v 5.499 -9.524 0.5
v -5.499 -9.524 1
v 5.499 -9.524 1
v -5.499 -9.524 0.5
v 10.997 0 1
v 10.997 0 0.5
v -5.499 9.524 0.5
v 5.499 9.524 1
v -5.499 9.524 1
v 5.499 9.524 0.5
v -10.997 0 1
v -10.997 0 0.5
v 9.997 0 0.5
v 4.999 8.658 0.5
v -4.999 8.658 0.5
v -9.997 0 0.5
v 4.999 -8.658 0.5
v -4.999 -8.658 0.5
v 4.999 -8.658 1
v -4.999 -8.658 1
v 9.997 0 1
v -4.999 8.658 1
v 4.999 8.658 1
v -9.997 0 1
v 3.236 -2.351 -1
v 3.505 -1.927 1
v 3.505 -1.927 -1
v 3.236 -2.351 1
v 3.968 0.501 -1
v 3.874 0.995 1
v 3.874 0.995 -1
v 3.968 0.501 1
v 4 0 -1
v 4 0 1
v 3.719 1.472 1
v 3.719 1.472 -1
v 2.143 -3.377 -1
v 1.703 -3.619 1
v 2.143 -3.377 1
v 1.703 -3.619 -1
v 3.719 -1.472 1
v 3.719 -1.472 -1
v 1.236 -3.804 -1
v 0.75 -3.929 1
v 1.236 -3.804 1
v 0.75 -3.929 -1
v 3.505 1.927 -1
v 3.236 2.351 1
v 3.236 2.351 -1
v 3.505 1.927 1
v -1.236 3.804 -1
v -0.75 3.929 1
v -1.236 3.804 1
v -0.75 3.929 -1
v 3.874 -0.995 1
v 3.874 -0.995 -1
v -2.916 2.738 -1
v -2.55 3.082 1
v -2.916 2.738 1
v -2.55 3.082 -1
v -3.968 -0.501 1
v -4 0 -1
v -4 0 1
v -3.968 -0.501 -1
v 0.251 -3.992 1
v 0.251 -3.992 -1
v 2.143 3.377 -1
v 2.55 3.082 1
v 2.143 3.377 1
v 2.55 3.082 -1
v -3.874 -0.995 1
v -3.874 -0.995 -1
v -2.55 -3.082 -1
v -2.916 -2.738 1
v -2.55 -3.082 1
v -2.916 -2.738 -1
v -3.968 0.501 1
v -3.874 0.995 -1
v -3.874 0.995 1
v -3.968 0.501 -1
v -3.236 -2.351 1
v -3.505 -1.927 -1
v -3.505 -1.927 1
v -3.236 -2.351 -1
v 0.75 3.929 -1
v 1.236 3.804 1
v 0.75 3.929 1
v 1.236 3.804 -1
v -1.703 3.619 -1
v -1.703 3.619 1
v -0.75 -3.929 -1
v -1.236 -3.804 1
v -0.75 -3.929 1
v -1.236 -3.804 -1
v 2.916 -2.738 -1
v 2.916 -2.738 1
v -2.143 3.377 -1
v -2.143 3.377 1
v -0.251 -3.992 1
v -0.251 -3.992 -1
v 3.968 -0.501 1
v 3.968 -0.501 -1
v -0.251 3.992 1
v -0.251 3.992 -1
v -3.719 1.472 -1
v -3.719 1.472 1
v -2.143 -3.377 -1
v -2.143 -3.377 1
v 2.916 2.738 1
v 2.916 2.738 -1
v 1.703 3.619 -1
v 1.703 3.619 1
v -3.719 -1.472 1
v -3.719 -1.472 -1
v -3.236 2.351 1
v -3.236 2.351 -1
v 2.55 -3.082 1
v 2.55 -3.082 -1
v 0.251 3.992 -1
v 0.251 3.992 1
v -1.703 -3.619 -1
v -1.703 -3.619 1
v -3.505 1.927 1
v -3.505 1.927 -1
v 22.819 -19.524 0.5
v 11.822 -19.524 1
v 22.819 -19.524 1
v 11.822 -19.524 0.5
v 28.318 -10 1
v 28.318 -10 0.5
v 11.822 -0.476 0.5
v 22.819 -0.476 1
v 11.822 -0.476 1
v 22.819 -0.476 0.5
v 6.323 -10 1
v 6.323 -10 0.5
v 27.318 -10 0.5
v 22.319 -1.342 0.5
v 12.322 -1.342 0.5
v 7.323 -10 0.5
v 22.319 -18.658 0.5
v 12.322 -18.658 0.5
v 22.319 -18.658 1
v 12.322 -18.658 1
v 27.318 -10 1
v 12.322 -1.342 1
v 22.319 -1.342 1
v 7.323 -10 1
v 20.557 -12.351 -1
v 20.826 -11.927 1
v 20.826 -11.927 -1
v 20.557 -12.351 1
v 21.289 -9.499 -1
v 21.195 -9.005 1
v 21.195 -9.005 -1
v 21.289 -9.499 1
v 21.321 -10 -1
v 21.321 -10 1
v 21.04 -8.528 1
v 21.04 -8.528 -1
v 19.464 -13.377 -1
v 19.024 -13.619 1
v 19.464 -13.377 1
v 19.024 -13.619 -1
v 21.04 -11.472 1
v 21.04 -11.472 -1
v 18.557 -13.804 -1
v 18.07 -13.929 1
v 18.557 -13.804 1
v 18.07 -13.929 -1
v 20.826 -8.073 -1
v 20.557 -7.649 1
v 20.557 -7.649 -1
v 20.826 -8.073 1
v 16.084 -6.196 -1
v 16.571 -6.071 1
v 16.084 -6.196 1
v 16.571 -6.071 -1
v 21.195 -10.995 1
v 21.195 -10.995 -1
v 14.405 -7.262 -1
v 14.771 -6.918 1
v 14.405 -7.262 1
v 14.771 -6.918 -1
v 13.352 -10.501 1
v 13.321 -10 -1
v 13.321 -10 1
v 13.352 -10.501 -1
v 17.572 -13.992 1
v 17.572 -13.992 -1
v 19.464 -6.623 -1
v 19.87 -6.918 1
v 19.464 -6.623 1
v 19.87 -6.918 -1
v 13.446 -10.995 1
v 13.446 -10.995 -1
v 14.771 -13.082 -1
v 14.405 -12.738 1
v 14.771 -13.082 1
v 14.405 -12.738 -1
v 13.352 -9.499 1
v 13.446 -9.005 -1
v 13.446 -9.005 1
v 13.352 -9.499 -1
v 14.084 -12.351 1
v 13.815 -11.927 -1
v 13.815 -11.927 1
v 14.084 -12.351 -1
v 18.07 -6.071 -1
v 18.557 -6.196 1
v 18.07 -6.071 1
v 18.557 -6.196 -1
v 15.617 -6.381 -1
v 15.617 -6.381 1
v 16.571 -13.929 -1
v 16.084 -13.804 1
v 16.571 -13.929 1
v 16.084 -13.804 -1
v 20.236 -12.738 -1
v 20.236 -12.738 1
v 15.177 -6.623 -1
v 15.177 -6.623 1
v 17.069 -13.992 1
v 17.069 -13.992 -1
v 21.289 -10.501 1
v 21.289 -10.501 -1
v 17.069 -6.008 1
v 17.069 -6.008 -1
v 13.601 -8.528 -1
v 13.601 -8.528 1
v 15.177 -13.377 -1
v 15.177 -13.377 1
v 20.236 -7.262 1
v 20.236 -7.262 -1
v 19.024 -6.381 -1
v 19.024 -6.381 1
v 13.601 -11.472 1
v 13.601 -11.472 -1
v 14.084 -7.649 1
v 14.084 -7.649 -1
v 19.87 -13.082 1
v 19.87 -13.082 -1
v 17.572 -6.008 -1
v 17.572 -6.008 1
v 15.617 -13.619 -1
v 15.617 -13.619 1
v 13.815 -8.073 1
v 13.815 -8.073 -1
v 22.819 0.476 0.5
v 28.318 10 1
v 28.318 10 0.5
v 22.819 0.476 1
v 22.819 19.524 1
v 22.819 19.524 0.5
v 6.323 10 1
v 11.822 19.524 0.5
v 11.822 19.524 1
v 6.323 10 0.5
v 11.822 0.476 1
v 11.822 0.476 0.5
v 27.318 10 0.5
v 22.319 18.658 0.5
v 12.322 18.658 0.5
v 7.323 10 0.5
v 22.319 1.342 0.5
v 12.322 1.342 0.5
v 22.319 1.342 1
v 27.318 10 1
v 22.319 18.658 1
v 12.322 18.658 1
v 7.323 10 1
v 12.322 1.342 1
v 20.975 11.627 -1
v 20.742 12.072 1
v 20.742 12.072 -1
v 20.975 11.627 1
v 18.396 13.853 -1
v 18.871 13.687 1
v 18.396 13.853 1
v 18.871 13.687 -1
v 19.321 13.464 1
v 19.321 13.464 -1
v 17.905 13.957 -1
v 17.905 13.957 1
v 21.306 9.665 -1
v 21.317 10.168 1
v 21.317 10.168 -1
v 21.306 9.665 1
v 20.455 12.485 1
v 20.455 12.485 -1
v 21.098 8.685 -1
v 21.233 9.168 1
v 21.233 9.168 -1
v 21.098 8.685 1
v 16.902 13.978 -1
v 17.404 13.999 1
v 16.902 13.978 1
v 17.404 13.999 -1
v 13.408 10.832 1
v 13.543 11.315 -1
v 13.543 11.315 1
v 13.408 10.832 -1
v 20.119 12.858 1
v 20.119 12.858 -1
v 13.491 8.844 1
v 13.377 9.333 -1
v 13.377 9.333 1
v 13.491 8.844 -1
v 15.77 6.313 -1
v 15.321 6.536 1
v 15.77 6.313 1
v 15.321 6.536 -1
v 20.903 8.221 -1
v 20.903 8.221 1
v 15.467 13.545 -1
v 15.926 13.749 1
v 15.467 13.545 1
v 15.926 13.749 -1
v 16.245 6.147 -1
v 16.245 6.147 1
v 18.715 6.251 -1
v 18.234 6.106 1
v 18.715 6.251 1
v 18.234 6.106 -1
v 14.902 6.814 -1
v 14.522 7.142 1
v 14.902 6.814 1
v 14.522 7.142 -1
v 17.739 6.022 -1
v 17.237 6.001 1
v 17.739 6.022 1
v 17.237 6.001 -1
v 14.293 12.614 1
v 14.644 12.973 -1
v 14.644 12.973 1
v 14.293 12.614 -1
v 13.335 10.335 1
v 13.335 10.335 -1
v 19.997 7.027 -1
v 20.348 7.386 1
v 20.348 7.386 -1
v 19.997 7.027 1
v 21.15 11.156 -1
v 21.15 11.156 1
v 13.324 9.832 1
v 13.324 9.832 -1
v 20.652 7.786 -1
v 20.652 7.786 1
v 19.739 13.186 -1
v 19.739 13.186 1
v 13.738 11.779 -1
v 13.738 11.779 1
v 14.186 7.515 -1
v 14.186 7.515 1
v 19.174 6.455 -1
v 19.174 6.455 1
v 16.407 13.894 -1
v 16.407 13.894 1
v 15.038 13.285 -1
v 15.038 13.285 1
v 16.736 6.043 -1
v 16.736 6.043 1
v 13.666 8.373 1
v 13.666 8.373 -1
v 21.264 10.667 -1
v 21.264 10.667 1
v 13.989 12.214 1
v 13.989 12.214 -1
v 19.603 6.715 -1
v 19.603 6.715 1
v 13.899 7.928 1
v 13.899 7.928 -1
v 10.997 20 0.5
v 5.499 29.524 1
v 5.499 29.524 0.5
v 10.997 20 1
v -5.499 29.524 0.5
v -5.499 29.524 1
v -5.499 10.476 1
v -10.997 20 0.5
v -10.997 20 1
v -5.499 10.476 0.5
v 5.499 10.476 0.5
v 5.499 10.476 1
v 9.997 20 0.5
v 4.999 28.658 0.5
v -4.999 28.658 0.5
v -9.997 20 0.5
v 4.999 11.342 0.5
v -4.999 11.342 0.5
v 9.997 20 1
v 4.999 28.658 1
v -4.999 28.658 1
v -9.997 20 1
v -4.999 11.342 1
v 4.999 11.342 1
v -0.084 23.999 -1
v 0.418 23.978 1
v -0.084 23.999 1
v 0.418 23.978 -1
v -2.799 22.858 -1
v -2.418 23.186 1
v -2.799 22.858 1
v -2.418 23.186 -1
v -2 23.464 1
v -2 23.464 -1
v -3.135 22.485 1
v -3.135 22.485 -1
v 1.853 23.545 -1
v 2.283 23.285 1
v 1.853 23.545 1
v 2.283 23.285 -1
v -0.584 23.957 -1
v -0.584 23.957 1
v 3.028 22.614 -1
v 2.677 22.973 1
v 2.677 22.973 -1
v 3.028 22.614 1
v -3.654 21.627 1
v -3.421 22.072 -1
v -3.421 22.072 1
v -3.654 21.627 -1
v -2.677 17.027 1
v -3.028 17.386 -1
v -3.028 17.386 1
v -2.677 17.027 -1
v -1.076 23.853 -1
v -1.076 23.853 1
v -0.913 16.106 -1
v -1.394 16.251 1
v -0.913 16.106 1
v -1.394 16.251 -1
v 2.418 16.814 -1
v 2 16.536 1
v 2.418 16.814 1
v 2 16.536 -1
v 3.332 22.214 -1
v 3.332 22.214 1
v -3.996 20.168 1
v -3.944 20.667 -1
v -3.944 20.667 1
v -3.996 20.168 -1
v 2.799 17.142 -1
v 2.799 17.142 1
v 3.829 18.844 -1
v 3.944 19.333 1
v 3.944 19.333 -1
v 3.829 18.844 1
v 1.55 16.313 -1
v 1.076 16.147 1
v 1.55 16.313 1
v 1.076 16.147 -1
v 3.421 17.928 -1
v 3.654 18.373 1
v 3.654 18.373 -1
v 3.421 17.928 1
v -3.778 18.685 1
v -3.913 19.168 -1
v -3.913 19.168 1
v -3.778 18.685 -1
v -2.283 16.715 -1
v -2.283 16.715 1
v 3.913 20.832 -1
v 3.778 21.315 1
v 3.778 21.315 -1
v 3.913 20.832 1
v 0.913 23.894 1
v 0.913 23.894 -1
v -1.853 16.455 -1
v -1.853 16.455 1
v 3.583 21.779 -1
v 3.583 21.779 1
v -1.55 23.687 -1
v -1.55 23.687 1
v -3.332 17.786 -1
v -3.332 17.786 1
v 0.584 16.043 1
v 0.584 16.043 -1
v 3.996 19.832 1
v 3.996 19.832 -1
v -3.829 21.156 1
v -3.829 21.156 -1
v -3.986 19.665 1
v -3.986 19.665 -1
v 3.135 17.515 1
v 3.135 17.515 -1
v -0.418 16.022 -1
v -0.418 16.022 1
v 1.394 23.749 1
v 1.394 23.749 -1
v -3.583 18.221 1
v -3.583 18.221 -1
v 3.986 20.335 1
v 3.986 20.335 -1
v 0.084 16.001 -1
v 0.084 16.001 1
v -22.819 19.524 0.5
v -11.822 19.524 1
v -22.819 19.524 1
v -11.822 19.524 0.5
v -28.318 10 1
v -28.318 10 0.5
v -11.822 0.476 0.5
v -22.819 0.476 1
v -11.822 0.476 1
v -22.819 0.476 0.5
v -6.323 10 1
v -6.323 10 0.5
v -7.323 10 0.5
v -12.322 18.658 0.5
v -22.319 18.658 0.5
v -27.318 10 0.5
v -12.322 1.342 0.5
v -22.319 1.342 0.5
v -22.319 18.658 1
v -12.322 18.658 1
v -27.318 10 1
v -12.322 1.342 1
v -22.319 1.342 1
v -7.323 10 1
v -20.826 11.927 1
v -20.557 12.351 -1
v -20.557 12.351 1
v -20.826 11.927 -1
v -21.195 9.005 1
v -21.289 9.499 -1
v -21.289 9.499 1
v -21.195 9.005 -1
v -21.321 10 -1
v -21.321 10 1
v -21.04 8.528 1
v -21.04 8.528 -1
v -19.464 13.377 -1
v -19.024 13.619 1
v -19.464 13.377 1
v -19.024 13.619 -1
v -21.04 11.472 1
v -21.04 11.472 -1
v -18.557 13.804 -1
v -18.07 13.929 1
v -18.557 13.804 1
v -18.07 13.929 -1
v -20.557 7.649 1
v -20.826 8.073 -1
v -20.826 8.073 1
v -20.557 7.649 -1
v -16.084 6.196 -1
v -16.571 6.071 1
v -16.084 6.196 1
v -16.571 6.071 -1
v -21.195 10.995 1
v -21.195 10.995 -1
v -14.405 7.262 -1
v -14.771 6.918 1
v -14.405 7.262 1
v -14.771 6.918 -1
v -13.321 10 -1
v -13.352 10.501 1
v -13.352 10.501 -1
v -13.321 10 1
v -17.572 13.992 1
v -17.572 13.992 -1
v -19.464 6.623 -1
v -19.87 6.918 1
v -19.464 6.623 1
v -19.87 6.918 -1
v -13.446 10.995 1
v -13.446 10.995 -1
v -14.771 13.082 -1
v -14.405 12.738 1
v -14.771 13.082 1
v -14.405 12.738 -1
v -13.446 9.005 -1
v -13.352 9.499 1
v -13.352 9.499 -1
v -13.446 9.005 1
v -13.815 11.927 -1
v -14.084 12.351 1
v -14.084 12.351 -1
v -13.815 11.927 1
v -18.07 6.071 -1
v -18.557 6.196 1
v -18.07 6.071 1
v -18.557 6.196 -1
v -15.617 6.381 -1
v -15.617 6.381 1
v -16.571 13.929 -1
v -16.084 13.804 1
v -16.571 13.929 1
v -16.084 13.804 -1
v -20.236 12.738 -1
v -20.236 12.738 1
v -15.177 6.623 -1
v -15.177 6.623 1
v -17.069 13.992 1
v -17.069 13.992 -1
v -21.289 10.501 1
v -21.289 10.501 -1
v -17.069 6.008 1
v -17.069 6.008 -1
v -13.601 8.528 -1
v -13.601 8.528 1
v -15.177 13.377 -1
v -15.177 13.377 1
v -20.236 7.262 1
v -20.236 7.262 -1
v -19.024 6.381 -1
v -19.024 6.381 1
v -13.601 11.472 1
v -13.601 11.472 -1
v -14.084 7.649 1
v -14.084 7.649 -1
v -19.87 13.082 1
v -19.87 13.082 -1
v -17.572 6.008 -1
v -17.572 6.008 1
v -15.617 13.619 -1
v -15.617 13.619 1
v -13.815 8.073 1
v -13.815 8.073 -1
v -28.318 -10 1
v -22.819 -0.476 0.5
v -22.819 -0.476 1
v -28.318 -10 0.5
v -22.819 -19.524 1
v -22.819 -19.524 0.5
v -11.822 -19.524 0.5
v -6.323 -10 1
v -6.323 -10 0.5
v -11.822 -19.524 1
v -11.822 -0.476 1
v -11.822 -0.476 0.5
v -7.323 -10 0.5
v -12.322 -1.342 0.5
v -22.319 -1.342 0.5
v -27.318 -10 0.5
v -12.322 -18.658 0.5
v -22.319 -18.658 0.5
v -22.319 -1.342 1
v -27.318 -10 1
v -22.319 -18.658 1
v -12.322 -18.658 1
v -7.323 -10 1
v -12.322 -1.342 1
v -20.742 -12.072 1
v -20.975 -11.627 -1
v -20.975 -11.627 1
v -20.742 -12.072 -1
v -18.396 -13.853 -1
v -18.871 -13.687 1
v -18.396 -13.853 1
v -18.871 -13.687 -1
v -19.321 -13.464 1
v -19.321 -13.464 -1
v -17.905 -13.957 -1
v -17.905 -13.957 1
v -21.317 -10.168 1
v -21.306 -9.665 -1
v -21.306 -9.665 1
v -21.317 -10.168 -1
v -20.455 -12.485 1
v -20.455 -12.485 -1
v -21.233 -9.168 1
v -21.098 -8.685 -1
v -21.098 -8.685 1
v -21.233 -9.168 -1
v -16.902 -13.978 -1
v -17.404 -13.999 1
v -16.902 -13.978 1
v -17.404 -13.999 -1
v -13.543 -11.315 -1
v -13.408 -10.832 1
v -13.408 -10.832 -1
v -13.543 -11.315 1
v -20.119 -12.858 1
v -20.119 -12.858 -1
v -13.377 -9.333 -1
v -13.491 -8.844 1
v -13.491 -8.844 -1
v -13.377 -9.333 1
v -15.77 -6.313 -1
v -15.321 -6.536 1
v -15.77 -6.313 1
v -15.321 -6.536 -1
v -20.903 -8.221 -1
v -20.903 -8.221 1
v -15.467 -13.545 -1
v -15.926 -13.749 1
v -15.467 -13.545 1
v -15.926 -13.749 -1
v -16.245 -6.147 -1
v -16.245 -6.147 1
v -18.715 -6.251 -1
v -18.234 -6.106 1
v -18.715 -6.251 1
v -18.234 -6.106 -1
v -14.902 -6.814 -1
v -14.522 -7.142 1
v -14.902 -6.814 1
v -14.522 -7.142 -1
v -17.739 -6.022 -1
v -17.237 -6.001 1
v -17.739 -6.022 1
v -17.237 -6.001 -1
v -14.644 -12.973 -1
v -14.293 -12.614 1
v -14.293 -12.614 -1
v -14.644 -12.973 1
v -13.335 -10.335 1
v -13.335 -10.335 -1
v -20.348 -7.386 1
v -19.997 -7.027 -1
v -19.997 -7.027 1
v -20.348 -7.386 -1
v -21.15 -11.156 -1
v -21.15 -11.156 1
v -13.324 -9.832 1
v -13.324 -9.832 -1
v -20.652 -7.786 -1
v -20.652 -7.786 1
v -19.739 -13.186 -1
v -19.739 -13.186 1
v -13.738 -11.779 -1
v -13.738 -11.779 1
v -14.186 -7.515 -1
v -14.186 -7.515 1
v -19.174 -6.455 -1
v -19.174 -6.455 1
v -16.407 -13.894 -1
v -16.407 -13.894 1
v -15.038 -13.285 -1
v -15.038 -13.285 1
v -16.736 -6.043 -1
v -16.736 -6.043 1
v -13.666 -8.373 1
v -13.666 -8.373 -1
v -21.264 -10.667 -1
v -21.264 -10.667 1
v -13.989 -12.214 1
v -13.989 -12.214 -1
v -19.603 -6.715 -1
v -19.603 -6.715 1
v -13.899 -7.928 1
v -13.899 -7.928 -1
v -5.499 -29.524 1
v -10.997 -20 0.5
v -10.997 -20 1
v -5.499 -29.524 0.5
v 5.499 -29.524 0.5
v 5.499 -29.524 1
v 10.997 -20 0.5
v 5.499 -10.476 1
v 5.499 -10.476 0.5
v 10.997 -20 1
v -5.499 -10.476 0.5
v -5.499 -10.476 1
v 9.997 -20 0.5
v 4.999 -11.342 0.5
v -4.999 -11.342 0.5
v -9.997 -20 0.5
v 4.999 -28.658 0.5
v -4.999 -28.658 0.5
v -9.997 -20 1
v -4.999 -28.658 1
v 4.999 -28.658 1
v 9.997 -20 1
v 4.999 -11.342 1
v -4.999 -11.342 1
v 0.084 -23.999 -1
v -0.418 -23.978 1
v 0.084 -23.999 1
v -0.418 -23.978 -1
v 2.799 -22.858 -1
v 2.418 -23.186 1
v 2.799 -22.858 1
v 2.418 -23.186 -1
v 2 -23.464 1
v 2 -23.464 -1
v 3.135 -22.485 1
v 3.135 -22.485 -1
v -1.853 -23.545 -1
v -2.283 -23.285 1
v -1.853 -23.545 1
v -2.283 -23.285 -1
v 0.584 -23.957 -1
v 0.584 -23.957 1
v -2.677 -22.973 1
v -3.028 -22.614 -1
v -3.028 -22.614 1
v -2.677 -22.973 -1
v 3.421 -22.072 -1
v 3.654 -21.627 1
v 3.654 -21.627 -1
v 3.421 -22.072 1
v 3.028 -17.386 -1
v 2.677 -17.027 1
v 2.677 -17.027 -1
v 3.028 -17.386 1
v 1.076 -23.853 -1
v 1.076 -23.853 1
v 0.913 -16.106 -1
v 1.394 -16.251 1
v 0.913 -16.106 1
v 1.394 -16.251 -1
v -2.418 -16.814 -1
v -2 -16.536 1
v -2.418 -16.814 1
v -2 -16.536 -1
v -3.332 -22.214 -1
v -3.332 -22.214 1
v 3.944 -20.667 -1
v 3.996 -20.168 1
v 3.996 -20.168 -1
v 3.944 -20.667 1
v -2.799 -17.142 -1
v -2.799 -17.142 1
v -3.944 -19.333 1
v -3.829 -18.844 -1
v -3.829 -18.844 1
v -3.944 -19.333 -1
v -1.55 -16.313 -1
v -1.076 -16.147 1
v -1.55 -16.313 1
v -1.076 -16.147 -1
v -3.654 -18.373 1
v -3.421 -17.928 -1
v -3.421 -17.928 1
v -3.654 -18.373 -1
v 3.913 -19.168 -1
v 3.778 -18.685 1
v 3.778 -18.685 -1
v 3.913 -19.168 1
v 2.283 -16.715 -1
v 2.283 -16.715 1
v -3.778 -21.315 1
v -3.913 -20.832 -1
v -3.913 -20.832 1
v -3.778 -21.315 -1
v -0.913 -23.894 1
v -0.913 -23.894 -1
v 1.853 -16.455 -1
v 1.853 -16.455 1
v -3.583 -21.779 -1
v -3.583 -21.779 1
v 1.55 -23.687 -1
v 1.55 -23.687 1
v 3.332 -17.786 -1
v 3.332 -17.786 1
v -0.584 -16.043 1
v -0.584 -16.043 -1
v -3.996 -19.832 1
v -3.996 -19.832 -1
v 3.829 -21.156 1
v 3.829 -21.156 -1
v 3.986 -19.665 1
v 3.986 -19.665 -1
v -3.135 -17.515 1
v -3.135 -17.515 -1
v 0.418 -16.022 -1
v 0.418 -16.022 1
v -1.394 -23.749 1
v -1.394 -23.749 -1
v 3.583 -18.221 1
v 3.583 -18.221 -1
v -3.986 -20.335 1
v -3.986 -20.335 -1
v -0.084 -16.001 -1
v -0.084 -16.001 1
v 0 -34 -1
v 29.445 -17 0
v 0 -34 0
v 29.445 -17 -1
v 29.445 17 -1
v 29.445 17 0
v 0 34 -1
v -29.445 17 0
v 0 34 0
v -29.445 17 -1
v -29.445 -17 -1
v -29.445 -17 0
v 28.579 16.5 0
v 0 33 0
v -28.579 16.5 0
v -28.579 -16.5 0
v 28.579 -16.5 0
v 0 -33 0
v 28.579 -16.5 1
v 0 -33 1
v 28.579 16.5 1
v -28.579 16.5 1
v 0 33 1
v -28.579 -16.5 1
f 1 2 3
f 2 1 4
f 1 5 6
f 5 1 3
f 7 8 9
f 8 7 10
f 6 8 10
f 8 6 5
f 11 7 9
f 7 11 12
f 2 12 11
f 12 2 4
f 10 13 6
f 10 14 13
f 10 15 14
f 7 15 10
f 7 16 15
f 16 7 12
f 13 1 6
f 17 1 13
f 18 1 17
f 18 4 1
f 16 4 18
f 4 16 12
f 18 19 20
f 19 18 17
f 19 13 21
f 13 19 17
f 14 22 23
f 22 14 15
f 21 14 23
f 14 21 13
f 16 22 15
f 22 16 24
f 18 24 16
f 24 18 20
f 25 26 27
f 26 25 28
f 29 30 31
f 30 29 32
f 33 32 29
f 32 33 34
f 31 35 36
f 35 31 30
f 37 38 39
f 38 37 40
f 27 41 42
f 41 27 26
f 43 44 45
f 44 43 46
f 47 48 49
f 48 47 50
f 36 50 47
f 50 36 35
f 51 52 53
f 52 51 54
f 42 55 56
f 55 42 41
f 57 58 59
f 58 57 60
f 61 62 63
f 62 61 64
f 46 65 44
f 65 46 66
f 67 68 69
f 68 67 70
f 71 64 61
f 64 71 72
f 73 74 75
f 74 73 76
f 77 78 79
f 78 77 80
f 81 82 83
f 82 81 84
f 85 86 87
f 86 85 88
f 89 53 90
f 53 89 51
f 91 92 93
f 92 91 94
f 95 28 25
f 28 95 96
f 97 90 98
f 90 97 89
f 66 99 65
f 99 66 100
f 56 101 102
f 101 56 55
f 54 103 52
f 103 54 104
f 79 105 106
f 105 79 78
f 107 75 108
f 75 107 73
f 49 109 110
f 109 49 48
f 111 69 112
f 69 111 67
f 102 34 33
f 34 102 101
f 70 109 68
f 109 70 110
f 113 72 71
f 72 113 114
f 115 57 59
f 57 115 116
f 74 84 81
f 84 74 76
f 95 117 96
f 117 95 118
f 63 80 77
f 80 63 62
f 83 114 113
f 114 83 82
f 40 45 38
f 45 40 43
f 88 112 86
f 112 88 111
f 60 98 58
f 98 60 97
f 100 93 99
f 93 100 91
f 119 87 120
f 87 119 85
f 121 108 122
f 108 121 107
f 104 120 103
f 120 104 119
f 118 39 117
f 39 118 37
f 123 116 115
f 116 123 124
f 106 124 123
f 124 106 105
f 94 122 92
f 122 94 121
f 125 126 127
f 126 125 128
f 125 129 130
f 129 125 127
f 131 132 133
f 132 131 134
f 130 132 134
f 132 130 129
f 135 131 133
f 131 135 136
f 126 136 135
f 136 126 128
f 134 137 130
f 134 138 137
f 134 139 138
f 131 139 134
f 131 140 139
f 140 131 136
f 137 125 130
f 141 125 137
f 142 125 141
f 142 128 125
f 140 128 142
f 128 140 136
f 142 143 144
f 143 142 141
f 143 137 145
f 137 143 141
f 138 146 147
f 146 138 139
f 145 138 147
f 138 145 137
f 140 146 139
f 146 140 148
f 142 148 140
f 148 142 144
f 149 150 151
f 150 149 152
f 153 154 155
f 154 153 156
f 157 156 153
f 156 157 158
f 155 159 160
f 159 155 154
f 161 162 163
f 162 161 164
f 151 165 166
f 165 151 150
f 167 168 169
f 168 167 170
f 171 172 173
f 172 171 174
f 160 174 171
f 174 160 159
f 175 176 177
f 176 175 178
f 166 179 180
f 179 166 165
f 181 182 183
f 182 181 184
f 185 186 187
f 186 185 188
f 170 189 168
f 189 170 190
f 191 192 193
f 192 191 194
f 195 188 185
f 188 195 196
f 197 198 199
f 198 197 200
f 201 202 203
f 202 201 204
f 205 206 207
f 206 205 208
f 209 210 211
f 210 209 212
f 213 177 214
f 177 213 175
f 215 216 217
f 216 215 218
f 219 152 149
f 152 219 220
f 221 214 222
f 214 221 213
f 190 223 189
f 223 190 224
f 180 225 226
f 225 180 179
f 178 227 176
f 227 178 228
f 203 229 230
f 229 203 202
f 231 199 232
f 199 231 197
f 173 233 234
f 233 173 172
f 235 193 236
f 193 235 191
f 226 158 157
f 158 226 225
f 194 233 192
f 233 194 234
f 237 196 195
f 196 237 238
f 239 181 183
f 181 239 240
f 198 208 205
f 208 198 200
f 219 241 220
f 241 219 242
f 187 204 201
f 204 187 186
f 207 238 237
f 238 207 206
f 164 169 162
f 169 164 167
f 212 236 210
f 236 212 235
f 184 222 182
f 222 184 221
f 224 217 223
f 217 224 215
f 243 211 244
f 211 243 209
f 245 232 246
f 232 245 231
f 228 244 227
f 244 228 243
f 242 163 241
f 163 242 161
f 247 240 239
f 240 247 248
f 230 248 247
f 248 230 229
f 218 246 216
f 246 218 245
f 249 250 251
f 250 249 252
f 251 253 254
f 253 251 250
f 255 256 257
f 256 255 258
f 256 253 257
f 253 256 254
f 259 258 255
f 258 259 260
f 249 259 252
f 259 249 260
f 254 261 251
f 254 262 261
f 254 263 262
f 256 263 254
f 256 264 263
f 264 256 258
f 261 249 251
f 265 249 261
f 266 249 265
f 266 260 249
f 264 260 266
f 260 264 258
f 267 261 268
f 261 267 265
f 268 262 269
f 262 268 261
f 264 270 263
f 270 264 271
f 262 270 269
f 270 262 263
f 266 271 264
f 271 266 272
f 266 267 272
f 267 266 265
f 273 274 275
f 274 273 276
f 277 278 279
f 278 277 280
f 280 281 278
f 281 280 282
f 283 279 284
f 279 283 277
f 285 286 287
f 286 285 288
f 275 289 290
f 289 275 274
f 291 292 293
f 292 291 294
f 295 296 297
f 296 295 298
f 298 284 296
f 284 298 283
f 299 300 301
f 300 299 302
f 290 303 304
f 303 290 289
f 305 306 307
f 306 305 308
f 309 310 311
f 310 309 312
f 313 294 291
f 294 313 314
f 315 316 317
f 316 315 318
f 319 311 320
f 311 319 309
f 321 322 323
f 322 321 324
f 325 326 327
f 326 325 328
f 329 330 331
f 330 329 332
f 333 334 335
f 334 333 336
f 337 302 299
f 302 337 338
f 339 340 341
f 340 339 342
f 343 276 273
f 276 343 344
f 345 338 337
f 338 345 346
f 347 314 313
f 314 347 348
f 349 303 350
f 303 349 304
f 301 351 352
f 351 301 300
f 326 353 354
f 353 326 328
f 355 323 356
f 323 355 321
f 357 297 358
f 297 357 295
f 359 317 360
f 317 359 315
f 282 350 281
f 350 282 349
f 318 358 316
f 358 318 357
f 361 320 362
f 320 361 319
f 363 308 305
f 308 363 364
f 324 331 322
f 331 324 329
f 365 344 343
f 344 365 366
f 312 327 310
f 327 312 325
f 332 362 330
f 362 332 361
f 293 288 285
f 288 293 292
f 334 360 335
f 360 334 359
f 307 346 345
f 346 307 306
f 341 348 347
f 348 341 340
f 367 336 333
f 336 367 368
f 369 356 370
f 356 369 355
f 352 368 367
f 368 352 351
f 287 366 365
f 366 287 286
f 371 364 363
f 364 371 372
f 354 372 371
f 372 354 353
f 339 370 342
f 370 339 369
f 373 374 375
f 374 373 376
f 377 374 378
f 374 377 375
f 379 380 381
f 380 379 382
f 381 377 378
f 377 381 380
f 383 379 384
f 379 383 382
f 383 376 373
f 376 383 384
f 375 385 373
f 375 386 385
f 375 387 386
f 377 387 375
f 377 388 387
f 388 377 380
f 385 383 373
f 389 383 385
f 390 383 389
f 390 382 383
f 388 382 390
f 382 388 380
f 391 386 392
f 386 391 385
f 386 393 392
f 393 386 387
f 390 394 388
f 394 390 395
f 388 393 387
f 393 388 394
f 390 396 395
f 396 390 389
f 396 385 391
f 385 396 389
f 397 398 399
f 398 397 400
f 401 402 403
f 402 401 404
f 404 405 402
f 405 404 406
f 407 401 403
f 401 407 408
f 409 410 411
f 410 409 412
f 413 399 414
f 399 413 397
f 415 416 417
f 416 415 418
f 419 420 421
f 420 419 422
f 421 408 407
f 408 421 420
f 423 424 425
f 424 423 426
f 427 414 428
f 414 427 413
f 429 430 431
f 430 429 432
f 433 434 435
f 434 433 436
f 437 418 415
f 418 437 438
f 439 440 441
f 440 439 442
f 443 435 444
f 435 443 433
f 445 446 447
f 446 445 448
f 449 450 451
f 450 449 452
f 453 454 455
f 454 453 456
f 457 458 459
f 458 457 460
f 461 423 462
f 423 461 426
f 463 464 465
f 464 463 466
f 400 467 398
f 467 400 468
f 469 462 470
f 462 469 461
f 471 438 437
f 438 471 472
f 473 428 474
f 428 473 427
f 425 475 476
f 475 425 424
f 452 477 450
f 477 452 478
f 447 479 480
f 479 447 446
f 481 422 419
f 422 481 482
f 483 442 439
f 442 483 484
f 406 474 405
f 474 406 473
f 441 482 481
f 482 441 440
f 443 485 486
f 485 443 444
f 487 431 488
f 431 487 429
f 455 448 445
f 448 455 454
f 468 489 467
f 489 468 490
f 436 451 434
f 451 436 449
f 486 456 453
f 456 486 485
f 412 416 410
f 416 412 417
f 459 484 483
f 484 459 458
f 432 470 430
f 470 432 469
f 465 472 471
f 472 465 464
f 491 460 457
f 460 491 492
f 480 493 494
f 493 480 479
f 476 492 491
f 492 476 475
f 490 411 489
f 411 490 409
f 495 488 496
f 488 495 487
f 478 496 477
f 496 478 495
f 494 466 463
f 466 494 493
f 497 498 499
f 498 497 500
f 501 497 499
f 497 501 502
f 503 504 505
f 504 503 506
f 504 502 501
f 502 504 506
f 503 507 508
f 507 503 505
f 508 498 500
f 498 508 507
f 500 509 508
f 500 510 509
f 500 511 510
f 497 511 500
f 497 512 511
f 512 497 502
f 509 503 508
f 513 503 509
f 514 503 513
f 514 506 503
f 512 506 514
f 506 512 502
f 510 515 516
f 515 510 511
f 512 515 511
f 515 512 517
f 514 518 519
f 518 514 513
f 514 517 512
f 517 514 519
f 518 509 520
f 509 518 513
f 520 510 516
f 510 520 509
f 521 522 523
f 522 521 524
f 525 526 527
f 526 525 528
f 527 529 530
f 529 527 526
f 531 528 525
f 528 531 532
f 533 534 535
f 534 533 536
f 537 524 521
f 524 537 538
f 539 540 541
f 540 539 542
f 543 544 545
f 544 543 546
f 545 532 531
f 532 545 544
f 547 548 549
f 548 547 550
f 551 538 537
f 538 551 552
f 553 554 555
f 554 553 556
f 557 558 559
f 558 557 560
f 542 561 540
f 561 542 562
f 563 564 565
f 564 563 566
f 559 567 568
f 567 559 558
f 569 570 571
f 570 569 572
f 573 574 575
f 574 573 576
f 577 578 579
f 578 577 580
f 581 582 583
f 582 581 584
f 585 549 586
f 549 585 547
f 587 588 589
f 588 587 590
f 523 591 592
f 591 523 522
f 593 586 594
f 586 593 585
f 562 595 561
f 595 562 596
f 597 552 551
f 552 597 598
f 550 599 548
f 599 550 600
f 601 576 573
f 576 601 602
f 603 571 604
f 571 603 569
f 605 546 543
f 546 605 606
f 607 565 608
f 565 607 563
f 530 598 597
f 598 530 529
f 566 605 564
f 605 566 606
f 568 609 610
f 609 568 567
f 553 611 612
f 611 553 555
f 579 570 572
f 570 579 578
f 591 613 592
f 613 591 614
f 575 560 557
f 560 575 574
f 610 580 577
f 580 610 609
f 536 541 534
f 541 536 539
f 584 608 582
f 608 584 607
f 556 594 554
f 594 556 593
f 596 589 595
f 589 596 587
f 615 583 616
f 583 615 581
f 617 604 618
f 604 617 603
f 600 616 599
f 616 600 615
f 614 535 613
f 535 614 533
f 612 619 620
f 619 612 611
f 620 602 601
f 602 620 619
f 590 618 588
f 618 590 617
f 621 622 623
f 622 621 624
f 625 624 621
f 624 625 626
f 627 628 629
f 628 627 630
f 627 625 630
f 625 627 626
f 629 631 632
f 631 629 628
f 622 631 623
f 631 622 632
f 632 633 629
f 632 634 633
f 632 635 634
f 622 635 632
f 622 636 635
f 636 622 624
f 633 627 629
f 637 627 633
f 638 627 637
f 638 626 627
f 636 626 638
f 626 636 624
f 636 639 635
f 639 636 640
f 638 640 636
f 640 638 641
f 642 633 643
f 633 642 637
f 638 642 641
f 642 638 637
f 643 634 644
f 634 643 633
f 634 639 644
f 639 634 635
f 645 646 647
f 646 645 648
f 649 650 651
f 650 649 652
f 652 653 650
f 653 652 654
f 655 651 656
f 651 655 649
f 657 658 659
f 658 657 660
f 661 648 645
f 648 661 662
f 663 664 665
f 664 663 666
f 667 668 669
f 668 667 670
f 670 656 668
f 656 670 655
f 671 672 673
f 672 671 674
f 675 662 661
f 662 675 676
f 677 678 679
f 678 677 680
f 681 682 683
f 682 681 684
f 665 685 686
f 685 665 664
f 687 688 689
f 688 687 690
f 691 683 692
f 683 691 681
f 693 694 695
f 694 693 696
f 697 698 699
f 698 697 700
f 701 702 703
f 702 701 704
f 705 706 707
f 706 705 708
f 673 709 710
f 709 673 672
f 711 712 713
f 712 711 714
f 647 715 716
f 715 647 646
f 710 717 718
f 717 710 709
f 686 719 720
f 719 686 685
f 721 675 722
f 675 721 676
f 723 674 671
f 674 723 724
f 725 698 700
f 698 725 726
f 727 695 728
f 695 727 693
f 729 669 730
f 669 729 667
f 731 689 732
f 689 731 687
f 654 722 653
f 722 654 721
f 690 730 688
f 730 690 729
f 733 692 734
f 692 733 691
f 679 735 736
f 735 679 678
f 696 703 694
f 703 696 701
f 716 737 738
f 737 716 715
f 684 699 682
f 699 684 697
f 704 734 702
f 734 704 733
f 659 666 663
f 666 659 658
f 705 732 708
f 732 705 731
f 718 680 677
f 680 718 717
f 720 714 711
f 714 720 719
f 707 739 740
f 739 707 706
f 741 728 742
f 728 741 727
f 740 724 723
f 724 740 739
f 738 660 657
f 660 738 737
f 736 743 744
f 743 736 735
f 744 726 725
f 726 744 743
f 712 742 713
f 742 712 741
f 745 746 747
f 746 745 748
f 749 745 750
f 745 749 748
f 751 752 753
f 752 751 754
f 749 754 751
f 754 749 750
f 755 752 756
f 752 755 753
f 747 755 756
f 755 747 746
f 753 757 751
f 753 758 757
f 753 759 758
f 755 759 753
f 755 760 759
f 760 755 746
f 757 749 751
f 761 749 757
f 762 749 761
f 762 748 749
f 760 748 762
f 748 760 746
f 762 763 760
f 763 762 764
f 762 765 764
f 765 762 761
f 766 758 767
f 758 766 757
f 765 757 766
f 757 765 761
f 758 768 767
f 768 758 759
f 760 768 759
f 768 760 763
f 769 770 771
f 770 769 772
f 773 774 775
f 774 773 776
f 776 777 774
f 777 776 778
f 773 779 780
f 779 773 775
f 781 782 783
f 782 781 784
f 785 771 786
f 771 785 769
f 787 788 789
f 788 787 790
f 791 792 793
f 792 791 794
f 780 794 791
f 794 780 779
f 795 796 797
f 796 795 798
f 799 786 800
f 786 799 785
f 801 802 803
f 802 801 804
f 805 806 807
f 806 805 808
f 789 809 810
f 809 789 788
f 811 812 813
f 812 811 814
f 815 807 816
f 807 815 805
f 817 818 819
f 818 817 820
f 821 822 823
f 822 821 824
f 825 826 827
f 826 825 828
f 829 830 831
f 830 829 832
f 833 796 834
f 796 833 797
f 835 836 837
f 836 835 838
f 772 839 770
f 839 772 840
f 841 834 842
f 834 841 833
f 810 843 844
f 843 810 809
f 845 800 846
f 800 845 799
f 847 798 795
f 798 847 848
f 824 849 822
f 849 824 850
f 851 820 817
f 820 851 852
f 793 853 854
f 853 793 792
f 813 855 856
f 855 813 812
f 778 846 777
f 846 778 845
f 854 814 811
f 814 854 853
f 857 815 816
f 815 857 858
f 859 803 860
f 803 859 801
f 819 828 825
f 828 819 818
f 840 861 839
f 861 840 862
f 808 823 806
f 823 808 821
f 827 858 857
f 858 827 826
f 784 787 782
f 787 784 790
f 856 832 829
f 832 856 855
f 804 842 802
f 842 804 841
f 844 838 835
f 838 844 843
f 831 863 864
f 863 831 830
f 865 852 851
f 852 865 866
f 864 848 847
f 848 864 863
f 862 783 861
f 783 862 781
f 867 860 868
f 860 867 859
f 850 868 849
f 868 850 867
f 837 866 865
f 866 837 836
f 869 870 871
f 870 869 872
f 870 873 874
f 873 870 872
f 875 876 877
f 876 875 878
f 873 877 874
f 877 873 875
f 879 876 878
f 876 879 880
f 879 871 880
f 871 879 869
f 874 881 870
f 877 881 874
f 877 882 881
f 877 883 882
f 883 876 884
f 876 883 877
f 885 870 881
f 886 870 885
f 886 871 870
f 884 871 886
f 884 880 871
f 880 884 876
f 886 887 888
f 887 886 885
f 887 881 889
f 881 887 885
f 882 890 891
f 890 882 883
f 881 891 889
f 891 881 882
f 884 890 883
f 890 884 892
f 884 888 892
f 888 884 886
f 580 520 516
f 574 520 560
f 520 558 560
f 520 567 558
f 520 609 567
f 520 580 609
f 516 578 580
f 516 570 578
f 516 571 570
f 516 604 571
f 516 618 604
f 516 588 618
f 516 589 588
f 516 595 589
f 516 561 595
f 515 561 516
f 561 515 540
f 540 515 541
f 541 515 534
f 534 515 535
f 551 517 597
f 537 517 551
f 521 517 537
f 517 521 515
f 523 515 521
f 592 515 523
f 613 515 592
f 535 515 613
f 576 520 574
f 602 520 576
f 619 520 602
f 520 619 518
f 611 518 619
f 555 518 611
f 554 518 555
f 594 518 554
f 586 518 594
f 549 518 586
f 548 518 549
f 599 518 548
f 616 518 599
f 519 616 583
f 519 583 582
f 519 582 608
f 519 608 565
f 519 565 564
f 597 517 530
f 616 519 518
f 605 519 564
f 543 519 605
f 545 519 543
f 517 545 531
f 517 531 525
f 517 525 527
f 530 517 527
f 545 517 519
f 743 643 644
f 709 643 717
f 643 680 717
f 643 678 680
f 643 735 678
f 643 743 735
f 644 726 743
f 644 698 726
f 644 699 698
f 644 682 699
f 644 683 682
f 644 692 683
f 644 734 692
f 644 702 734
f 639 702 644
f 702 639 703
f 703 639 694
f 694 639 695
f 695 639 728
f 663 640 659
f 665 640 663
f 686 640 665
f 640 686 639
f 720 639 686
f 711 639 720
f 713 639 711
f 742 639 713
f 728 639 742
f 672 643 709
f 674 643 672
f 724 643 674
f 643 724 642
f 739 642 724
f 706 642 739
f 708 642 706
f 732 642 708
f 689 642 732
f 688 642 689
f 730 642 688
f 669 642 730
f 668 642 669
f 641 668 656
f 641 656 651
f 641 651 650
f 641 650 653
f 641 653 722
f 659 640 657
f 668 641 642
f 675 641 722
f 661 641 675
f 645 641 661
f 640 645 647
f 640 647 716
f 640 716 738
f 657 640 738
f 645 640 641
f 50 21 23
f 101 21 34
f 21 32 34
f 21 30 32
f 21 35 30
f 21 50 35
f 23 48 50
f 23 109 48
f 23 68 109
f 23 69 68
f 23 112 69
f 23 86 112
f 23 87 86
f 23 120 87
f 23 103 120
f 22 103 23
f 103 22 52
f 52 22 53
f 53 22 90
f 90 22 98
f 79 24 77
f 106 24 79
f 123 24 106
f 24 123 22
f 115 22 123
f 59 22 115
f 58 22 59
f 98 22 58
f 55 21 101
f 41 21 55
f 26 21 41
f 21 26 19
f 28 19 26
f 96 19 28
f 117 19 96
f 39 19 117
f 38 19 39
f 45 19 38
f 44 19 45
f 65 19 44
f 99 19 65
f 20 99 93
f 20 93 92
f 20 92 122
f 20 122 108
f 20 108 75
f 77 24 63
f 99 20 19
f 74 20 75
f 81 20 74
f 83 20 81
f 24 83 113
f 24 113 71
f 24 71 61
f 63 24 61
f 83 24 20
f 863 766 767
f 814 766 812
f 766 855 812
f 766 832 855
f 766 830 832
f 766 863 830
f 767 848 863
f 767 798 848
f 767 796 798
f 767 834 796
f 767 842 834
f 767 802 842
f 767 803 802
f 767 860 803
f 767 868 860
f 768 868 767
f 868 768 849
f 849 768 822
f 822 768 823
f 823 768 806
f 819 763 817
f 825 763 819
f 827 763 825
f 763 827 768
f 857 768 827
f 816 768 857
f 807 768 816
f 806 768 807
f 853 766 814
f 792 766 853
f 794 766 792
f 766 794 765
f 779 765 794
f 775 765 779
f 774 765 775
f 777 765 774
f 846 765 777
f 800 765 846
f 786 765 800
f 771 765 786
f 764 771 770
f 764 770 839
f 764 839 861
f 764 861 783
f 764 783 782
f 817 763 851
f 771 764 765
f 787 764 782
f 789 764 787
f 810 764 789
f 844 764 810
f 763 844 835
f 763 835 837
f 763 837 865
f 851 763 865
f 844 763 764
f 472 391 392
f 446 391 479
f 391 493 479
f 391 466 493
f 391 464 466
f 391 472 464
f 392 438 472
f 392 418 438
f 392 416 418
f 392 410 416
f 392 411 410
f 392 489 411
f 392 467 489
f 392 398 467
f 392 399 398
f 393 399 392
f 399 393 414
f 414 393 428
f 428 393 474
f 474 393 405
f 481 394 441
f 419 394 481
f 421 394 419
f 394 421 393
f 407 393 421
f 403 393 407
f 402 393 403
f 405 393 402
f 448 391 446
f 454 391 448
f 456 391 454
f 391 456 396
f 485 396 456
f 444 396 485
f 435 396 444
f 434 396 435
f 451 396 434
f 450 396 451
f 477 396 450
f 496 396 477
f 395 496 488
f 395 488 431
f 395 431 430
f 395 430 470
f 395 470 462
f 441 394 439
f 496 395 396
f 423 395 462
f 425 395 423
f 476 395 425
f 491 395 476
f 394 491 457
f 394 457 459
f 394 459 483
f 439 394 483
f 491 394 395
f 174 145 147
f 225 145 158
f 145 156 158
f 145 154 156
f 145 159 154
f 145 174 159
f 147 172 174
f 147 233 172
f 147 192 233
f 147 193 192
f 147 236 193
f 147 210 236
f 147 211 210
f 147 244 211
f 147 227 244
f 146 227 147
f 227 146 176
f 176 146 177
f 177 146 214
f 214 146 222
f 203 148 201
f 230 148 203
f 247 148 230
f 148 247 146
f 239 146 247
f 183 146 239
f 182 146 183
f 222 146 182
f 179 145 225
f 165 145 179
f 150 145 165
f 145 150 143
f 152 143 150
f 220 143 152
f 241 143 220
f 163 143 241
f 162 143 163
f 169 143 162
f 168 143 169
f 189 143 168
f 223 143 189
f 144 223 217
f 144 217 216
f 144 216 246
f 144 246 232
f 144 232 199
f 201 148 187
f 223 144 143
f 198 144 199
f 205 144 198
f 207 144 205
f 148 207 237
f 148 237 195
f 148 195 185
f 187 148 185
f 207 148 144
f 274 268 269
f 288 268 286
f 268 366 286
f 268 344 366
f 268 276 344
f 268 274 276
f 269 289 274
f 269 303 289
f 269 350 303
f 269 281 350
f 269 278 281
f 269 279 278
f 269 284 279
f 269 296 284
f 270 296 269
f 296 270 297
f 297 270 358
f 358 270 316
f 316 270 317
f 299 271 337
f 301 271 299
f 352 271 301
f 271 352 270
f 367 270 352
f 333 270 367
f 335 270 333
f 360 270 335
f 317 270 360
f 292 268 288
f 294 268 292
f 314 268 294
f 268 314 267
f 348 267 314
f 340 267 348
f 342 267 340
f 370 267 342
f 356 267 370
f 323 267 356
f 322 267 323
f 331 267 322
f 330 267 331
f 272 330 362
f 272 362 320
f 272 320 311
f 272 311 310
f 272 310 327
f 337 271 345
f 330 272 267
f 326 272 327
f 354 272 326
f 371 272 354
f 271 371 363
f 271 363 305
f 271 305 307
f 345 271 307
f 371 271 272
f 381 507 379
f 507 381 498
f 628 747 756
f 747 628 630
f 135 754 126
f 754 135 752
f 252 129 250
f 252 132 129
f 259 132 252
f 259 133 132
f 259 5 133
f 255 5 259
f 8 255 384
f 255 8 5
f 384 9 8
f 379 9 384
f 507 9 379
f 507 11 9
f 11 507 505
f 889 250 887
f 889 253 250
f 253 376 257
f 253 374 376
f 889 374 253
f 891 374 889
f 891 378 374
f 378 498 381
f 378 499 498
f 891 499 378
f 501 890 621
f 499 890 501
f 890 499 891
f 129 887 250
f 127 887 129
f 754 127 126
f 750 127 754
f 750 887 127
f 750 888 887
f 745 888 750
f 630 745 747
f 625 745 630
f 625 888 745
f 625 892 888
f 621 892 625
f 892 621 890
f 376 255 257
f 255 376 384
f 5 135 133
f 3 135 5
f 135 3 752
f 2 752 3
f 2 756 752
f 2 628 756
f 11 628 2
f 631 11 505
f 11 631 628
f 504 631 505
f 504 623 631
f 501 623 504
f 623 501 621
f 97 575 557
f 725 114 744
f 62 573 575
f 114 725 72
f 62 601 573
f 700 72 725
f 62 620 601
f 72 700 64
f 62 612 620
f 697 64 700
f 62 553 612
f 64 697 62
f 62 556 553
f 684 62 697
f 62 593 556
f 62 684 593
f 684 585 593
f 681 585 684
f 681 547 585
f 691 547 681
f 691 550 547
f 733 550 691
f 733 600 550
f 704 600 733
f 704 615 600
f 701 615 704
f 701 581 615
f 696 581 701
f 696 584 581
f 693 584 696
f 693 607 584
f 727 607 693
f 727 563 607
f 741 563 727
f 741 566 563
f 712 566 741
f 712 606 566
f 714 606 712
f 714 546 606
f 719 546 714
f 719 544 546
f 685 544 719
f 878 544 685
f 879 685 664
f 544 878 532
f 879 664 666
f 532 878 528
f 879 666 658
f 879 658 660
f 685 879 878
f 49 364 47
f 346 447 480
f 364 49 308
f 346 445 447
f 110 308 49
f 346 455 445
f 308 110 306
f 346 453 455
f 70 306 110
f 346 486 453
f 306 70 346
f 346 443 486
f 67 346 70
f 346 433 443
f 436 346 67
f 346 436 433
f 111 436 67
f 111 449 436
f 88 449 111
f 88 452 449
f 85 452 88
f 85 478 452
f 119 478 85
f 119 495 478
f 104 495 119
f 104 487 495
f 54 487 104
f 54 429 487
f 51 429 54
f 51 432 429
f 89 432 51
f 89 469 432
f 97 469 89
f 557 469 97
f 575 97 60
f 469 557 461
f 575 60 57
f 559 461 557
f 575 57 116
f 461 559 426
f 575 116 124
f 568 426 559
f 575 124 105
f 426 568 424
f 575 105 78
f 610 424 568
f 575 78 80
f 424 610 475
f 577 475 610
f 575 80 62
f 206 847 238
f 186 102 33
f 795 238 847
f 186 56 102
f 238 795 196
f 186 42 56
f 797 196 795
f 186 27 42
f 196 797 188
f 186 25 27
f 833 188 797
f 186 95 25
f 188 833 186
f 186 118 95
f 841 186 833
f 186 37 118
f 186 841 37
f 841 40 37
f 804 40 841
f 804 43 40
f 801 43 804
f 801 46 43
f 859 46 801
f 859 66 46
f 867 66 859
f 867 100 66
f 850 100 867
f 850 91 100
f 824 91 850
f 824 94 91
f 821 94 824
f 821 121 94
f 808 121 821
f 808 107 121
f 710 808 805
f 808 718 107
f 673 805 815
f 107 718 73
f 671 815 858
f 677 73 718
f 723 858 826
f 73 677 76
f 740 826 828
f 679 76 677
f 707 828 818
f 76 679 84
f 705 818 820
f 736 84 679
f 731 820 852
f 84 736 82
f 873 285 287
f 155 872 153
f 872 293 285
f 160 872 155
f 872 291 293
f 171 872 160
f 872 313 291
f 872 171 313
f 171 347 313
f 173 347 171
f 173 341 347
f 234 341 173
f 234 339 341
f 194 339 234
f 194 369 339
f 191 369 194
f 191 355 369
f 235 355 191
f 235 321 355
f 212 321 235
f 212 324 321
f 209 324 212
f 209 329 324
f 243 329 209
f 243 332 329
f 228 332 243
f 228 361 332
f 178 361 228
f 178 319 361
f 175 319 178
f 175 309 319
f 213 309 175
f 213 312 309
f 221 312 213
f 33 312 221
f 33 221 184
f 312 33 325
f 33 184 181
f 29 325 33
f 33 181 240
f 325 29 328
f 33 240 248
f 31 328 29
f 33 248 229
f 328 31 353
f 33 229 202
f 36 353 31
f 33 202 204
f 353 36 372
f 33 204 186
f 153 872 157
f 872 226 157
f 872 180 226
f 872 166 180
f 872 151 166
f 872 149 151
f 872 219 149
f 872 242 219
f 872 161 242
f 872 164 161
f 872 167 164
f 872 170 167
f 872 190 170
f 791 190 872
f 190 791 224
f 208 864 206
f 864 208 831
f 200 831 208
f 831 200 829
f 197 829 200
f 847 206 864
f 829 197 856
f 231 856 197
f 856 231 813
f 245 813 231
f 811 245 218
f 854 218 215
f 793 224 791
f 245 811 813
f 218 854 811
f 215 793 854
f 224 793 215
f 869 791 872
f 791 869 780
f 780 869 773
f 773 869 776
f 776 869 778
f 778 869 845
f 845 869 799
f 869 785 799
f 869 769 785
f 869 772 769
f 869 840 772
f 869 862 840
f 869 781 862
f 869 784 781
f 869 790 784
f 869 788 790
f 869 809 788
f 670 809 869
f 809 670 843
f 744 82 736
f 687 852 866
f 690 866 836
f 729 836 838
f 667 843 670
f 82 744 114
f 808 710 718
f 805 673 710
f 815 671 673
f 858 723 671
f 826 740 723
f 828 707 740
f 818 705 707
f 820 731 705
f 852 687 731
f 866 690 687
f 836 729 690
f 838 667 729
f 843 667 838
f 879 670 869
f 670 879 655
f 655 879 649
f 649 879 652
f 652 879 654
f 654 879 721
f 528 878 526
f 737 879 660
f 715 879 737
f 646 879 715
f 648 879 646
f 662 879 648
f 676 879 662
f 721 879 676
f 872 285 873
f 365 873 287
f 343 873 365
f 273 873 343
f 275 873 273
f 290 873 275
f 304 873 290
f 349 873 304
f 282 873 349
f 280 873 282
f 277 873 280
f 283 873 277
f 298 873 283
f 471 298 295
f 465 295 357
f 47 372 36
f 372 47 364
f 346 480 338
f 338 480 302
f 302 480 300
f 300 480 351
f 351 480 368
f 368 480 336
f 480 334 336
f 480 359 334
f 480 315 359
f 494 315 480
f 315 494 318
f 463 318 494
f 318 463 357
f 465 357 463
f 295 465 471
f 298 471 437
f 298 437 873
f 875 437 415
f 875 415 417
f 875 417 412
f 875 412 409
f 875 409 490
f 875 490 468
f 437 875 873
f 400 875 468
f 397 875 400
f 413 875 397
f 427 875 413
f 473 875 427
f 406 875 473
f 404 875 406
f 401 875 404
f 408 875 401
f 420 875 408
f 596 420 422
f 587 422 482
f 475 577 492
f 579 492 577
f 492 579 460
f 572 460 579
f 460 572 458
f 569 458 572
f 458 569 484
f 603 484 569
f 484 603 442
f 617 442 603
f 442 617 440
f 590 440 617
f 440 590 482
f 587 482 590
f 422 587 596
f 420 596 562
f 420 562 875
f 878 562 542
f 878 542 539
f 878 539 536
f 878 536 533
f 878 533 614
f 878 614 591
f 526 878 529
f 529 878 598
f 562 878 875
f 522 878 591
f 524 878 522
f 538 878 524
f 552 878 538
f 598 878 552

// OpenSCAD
// HexHex Board Generator
//   by Michael Van Biesbrouck, (c) 2019.
//   License: Attribution 4.0 International
//            https://creativecommons.org/licenses/by/4.0/

/* [Basic Board Parameters] */
// Number of hexes on an edge.
hexhex_size = 2;        // [1:8]
// Diameter of balls in mm.
ball_diameter = 16;     // [5:30]
// Spacing between balls in mm.
separation = 4;         // [20]
// Diameter of holes in mm.
hole_diameter = 8;      // [15]
// Thickness of the board in mm.
board_thickness = 2;    // [1:20]
// Extra girth to the board in mm.
board_margin = 8;       // [20]
// Set to true for an irregular, interlocking perimeter.
modular = false;

/* [Decorative Cut Parameters] */
// Depth of decorative cut in mm.  (0 to disable.)
decoration_depth = 1;   // [0:0.25:20]
// Distance from board edge in mm.  (0 for bevel, large values to mark hexhex sub-boards.)
decoration_outer = 0;   // [1000]
// Width of decorative cut in mm.
decoration_width = 2;   // [1000]

/* [Guide Parameters] */
// Depth of guides for sliding balls between holes in mm.  (0 to disable.)
guide_depth = 0;        // [0:0.5:10]
// Width of guides in mm, best to just calculate this.
guide_width = hole_diameter / 2;
// If true, the guide will leave the board (e.g. Abalone board).
guide_exits = false;

/* [Drawn Hex Parameters] */
// Depth of lines for marked hexes in mm. (0 to disable.)
hex_line_depth = 0.5;   // [0:0.25:1]
// Width of hex lines in mm.
hex_line_width = 1;
// Spacing to separate hexes in mm.  (0 for a grid instead of separate hexes.)
hex_line_extra_space = 2;       // [0:0.5:20]
// It is possible to give a different depth to two hex rings.  Depth in mm.
hex_line_highlight_depth = 0;   // [0:0.25:1]
// First ring to highlight.  (0 to disable.)
hex_line_highlight_ring1 = 0;   // [10]
// Second ring to highlight.  (0 to disable.)
hex_line_highlight_ring2 = 0;   // [10]
hex_line_highlight_rings = [hex_line_highlight_ring1, hex_line_highlight_ring2];

eps = 0+0.00001;
board_diameter_mm = (2*hexhex_size-1)*(ball_diameter+separation)+board_margin;

spacing=ball_diameter+separation;
hex_diameter=spacing*sqrt(3/2)-hex_line_extra_space-hex_line_width/2;
h=sqrt(3/4)*spacing;

module horizontal_guides (spacing) {
    for (i = [0:hexhex_size-1]) translate ([i*h, 0, 0])
        cube ([guide_width, spacing*(2*hexhex_size-(guide_exits ? 0 : 2)-i), board_thickness], center=true);
}

module rotations () {
    for (i = [0:60:300]) rotate ([0, 0, i]) children();
}

module guides (spacing) {
    if (guide_depth > 0) rotations () translate ([0, 0, board_thickness-guide_depth])
    horizontal_guides (spacing);
}

function height (ring) = eps+board_thickness-(len(search(ring, hex_line_highlight_rings)) == 1 ? hex_line_highlight_depth : hex_line_depth);

module hexhex_arrangement_internal(spacing, rings) {
    rotations ()
        for (ring = rings) for (i = [0:ring-2])
            translate ([(ring-1)*h, (i+(1-ring)/2)*spacing, height(ring)]) children();
}

module hexhex_arrangement(spacing) {
    translate ([0, 0, height(1)]) children();
    hexhex_arrangement_internal(spacing, [2:hexhex_size]) children();
}

module board (diameter, thickness) {
    rotate ([0, 0, 30]) cylinder(h=thickness, d=diameter, center=true, $fn=6);
}

difference () {
    board (board_diameter_mm, board_thickness);
    hexhex_arrangement(spacing) union () {
        cylinder(h=4*board_thickness, d=hole_diameter, center=true, $fn=50);
        difference () {
            cylinder(h=board_thickness, d=hex_diameter, center=true, $fn=6);
            cylinder(h=board_thickness, d=hex_diameter-2*hex_line_width, center=true, $fn=6);
        }
    }
    if (decoration_depth > 0) translate ([0, 0, board_thickness-decoration_depth]) difference () {
        board (board_diameter_mm-decoration_outer, board_thickness);
        board (board_diameter_mm-decoration_outer-decoration_width, board_thickness+1);
    }
    guides (spacing);
    if (modular) hexhex_arrangement_internal(spacing, hexhex_size+1) cylinder(h=4*board_thickness, d=spacing*sqrt(3/2), center=true, $fn=6);
}
